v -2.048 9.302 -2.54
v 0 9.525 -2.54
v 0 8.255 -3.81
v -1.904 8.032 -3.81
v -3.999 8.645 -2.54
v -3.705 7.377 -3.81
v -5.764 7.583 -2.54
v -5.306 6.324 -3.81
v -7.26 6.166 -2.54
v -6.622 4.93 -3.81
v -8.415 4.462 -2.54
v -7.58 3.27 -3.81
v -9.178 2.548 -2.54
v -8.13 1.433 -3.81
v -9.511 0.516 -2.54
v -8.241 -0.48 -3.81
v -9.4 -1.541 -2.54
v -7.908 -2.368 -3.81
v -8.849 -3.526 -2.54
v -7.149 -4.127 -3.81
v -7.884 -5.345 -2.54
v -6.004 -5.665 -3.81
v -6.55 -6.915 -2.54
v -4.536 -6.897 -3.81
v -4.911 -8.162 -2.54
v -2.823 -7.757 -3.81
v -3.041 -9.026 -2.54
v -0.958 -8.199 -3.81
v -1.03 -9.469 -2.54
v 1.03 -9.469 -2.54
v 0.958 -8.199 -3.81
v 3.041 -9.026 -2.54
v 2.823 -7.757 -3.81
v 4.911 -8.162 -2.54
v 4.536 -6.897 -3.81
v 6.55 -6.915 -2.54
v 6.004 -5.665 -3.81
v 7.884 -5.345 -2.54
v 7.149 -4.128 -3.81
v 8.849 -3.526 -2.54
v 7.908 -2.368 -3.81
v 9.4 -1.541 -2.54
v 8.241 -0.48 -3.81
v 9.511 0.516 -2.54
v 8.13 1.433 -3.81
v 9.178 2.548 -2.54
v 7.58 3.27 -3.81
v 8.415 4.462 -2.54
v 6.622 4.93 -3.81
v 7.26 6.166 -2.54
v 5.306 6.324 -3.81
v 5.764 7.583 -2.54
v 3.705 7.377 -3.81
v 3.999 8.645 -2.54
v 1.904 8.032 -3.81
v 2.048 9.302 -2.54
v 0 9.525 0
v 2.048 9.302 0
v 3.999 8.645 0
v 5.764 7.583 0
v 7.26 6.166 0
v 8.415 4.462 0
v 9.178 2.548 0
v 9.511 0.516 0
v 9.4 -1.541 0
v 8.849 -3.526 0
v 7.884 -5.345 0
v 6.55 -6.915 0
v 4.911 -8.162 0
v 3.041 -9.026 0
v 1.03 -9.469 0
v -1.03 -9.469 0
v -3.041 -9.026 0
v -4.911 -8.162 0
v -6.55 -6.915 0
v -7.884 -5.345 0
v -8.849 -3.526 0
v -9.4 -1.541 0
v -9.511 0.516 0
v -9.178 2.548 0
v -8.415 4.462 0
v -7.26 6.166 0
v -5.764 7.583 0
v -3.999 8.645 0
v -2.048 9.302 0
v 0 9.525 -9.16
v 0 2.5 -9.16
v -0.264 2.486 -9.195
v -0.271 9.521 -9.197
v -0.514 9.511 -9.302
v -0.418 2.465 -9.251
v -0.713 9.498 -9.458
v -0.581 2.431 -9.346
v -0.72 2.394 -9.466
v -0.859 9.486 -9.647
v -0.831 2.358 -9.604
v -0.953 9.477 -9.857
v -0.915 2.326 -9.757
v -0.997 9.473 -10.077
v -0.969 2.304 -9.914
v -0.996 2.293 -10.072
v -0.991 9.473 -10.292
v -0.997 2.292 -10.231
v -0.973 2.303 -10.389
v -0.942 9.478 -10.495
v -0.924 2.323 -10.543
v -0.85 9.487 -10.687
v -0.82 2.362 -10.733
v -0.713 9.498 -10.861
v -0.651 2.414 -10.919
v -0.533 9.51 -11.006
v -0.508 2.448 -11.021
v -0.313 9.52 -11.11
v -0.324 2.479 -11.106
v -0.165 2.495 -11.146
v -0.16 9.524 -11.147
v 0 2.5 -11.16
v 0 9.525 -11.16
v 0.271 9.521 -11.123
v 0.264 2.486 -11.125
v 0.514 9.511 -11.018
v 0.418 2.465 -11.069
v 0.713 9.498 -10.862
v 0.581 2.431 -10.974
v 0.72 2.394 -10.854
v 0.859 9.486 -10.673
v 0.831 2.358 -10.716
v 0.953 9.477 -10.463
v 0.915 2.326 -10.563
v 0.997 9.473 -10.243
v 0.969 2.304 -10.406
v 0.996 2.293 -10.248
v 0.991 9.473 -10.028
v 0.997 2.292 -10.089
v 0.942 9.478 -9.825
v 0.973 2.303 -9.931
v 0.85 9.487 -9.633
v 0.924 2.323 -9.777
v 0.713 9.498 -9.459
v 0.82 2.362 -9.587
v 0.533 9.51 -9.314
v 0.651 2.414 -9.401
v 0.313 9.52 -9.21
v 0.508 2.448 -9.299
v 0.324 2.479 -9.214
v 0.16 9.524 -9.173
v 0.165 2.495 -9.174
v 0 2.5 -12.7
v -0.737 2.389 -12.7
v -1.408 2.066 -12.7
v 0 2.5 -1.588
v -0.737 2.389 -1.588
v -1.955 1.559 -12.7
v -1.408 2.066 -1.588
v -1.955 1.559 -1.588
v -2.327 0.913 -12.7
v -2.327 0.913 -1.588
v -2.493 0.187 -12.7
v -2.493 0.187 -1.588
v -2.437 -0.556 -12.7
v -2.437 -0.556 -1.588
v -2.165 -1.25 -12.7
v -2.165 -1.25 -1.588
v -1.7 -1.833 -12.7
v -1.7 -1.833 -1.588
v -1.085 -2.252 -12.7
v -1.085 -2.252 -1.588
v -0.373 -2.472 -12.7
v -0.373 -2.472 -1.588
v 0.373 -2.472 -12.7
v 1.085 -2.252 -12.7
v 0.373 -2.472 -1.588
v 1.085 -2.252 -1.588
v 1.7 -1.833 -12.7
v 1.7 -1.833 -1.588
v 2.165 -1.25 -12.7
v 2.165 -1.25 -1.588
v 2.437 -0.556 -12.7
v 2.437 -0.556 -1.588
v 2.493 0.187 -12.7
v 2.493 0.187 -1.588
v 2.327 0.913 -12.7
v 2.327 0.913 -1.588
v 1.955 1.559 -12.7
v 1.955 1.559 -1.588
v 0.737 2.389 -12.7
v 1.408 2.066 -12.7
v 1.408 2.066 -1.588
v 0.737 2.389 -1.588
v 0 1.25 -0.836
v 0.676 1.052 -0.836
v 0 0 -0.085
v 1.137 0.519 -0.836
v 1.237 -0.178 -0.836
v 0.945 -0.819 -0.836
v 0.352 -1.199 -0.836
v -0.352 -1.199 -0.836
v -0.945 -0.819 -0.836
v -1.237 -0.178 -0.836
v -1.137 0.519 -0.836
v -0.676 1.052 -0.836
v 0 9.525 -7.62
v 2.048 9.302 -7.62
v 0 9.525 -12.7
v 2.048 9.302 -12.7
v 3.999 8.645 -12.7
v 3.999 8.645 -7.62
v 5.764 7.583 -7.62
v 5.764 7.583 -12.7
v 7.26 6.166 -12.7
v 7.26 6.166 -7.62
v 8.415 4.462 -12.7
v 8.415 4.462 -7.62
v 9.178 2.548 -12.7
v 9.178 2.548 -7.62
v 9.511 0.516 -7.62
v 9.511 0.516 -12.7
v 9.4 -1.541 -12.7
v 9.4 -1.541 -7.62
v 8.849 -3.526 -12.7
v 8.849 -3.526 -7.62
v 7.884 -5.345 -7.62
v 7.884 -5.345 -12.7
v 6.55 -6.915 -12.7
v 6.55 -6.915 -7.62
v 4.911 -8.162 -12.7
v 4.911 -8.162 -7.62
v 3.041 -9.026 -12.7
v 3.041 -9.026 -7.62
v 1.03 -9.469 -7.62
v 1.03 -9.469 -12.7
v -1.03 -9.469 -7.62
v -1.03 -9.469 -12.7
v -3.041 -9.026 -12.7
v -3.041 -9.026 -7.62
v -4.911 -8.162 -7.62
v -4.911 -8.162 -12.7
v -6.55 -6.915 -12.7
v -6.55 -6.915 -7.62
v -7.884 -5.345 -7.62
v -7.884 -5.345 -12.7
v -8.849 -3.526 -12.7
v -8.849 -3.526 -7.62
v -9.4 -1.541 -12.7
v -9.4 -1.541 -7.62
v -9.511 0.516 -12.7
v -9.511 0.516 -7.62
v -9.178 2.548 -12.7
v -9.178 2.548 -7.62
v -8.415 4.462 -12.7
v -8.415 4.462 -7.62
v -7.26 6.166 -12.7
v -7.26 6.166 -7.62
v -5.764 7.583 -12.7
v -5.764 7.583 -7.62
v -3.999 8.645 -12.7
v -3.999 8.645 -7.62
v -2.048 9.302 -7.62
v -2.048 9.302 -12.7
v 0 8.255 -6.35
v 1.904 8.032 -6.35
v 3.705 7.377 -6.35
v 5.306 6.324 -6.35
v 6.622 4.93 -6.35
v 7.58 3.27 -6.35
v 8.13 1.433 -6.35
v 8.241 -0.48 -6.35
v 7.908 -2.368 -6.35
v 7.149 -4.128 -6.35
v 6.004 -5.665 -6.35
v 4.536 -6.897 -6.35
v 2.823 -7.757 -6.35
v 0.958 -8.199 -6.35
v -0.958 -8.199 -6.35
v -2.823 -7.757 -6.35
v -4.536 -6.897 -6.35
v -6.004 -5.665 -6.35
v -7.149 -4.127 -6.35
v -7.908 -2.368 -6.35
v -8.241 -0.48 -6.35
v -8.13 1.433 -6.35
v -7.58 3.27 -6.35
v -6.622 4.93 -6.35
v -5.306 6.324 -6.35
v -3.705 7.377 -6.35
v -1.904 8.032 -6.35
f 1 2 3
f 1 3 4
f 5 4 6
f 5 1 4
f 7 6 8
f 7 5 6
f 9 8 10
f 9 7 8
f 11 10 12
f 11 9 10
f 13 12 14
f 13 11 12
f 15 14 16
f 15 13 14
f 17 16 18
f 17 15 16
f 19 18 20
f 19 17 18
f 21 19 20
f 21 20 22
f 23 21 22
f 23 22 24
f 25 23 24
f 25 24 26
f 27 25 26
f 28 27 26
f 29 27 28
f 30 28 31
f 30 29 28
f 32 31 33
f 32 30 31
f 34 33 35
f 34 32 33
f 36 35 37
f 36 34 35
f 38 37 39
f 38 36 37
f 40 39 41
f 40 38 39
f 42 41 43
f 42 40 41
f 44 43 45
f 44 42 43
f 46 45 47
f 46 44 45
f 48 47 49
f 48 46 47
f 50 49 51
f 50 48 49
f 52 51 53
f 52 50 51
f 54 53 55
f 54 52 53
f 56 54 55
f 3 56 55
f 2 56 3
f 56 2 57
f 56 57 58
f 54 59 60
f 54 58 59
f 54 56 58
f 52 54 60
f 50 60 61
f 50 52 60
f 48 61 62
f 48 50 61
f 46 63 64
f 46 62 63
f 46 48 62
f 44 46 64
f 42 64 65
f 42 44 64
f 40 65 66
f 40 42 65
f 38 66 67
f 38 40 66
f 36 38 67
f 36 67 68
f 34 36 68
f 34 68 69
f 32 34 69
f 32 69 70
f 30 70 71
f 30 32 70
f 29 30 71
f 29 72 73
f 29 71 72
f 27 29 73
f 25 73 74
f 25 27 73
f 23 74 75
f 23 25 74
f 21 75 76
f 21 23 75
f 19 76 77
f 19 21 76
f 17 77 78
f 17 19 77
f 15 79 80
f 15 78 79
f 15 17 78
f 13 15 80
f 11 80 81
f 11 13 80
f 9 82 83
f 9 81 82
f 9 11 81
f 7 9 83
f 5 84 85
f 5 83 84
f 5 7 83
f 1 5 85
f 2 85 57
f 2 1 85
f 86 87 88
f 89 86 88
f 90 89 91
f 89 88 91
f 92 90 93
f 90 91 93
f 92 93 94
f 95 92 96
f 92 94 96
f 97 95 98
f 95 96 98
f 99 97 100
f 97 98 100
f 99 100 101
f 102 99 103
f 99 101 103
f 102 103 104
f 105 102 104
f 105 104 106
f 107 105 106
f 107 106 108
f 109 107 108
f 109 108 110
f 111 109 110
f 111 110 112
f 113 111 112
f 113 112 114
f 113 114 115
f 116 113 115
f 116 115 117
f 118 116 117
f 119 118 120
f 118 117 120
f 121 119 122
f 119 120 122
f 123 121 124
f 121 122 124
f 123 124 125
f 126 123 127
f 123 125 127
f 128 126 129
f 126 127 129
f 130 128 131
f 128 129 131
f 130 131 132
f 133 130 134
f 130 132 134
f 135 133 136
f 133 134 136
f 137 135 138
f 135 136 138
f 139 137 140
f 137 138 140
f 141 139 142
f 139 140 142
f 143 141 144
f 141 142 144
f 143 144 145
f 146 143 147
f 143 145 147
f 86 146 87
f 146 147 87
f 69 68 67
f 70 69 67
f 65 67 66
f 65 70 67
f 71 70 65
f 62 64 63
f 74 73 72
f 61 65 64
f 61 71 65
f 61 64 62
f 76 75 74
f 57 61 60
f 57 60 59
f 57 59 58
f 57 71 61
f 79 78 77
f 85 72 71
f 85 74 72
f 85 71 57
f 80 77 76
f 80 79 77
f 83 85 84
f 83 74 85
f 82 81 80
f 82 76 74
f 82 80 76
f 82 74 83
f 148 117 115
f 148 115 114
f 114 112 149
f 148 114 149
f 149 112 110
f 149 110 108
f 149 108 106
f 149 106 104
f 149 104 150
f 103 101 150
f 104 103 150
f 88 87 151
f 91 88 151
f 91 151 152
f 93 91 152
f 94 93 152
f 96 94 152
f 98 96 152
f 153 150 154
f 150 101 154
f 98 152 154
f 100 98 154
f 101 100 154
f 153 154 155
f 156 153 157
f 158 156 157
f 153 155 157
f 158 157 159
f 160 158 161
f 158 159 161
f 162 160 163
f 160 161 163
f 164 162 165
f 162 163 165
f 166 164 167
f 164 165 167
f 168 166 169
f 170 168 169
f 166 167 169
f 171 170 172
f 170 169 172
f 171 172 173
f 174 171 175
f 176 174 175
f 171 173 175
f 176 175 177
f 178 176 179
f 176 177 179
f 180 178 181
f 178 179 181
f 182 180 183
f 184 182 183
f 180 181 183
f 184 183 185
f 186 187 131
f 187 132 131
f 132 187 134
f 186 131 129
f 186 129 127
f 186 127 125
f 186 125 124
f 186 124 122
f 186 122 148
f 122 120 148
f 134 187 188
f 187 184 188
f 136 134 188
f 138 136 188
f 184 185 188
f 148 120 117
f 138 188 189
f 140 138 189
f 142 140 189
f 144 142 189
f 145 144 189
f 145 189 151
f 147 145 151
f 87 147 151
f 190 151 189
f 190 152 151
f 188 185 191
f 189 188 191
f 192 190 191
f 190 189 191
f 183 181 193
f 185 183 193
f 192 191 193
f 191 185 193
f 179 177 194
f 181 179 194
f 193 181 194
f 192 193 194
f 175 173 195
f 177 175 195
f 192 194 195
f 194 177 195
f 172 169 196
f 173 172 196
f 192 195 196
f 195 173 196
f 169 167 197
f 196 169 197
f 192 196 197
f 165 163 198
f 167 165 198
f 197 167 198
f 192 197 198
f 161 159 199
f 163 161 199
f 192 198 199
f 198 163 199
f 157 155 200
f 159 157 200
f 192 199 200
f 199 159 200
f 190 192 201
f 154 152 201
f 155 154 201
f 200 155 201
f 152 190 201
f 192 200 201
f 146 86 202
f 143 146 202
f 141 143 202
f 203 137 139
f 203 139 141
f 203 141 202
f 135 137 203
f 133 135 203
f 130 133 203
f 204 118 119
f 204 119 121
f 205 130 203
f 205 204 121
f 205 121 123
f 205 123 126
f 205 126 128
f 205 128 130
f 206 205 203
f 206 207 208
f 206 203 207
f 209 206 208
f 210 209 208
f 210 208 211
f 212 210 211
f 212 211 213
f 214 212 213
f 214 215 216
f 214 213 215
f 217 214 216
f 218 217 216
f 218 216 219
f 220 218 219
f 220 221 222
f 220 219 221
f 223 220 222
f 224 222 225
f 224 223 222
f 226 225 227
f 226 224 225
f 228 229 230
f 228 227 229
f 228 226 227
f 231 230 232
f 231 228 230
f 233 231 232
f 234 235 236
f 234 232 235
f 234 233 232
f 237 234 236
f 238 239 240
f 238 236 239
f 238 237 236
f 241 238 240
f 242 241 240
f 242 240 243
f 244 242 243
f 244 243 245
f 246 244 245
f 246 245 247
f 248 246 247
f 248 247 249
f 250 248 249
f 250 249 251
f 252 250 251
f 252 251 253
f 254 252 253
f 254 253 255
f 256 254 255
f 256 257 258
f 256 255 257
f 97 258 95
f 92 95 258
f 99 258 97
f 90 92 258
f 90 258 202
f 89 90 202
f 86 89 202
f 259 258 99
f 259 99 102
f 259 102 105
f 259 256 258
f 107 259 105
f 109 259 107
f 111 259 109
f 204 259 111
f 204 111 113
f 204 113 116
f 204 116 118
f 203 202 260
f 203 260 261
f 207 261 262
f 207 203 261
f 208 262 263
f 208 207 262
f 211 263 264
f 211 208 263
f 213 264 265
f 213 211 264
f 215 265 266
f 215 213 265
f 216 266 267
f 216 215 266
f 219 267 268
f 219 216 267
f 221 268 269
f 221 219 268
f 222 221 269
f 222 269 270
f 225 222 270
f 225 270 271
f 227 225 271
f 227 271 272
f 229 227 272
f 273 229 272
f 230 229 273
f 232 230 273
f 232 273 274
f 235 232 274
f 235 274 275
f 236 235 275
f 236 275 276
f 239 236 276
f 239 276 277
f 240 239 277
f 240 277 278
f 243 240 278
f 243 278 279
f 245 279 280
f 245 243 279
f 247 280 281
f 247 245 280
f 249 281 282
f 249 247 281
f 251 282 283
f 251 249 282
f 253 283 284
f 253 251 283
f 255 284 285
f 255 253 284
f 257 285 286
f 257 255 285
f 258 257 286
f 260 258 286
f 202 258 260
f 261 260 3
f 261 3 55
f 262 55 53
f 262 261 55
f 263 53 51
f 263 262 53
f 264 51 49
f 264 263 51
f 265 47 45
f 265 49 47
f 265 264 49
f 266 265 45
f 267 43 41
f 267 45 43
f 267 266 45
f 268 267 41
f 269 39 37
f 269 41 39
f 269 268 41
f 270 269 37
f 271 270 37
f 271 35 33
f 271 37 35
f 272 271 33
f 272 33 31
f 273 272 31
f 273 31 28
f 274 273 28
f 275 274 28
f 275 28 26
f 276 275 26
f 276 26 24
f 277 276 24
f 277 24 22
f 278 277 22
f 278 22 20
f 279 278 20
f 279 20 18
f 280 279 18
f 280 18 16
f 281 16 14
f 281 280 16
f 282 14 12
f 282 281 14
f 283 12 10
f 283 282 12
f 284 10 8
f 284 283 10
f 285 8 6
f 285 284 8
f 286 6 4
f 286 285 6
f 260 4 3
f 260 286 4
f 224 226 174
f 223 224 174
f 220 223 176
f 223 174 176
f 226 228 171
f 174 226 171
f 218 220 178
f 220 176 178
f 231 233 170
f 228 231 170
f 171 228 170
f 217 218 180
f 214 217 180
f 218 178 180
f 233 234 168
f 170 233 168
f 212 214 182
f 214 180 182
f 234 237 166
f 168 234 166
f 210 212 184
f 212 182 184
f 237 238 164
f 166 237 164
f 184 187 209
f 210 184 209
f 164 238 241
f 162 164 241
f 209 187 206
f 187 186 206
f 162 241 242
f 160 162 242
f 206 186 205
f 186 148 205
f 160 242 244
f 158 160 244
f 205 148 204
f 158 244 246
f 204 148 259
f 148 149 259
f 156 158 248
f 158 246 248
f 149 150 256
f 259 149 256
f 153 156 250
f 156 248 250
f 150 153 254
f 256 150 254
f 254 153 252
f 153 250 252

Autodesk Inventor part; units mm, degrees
ref_plane "YZ Plane" through (0, 0, 0) normal (1, 0, 0) x (0, 1, 0)
ref_plane "XY Plane" through (0, 0, 0) normal (0, 0, 1) x (1, 0, 0)
sketch "Sketch1" plane through (0, 0, 0) normal (1, 0, 0) x (0, 1, 0)
  line L0 (0, 0) -> (9.525, 0)
  line L1 (9.525, 0) -> (9.525, -2.54)
  line L2 (9.525, -2.54) -> (8.255, -3.81)
  line L3 (8.255, -3.81) -> (8.255, -6.35)
  line L4 (8.255, -6.35) -> (9.525, -7.62)
  line L5 (9.525, -7.62) -> (9.525, -12.7)
  line L6 (9.525, -12.7) -> (0, -12.7)
  line L7 (0, -12.7) -> (0, 0)
  line L8 (0, -15.24) -> (0, 2.54) projected
  dimension "d0" = 9.525
  dimension "d1" = 135
  dimension "d2" = 2.54
  dimension "d4" = 1.27
  dimension "d5" = 12.7
  dimension "d7" = 2.54
revolve "Revolution1" add sketch "Sketch1" angle 360 about axis through (0, 0, -10) along (0, 0, 1)
sketch "Sketch2" plane through (0, 0, -12.7) normal (0, 0, -1) x (-1, 0, 0)
  circle A0 centre (0, 0) radius 9.525 projected
hole "Hole1" at (0, 0, -12.7) direction (0, 0, 1) diameter 5 depth 11.1125 tip angle 118
ref_plane "Work Plane1" through (0, 9.525, -10.16) normal (0, 1, 0) x (-1, 0, 0)
sketch "Sketch3" plane through (0, 9.525, -10.16) normal (0, 1, 0) x (-1, 0, 0)
  line L0 (0, 10.16) -> (0, 0) construction
  dimension "d16" = 10.16
hole "Hole2" at (0, 9.525, -10.16) direction (0, -1, 0) diameter 2 end up to surface
properties part number "wheel_hub"
